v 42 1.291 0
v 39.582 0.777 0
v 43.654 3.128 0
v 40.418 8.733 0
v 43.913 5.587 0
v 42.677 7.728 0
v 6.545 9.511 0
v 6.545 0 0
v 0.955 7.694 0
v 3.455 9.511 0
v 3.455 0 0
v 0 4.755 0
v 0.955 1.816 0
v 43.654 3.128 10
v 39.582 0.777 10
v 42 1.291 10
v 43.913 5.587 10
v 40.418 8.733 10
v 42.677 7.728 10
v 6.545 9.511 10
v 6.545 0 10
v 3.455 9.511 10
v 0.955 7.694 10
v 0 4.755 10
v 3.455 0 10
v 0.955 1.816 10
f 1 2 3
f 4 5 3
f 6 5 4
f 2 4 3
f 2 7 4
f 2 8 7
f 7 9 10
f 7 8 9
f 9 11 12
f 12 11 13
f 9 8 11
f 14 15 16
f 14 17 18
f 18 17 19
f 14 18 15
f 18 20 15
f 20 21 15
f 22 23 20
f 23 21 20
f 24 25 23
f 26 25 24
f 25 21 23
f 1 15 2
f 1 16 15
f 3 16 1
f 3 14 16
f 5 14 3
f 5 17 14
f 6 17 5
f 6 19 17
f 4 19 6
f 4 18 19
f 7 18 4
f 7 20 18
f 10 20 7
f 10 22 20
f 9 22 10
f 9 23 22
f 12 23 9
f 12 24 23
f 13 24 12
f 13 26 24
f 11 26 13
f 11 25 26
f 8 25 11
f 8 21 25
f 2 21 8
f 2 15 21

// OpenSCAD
$fn = 32;

// ----------------------------------------------------------------------
// Lever arm: two bosses 10 and 8 mm, 35 mm between centres
// ----------------------------------------------------------------------

// --- parameters (mm) ---
profile_height = 10;      // extrusion height
profile_points = 13;      // points of the closed outline

profile = [[0, 4.755], [0.955, 1.816], [3.455, 0], [6.545, 0], [39.582, 0.777], [42, 1.291], [43.654, 3.128], [43.913, 5.587], [42.677, 7.728], [40.418, 8.733], [6.545, 9.511], [3.455, 9.511], [0.955, 7.694]];  // single closed polygon, 13 points, counter clockwise

// --- the one profile operation ---
linear_extrude(height = profile_height) polygon(points = profile);
